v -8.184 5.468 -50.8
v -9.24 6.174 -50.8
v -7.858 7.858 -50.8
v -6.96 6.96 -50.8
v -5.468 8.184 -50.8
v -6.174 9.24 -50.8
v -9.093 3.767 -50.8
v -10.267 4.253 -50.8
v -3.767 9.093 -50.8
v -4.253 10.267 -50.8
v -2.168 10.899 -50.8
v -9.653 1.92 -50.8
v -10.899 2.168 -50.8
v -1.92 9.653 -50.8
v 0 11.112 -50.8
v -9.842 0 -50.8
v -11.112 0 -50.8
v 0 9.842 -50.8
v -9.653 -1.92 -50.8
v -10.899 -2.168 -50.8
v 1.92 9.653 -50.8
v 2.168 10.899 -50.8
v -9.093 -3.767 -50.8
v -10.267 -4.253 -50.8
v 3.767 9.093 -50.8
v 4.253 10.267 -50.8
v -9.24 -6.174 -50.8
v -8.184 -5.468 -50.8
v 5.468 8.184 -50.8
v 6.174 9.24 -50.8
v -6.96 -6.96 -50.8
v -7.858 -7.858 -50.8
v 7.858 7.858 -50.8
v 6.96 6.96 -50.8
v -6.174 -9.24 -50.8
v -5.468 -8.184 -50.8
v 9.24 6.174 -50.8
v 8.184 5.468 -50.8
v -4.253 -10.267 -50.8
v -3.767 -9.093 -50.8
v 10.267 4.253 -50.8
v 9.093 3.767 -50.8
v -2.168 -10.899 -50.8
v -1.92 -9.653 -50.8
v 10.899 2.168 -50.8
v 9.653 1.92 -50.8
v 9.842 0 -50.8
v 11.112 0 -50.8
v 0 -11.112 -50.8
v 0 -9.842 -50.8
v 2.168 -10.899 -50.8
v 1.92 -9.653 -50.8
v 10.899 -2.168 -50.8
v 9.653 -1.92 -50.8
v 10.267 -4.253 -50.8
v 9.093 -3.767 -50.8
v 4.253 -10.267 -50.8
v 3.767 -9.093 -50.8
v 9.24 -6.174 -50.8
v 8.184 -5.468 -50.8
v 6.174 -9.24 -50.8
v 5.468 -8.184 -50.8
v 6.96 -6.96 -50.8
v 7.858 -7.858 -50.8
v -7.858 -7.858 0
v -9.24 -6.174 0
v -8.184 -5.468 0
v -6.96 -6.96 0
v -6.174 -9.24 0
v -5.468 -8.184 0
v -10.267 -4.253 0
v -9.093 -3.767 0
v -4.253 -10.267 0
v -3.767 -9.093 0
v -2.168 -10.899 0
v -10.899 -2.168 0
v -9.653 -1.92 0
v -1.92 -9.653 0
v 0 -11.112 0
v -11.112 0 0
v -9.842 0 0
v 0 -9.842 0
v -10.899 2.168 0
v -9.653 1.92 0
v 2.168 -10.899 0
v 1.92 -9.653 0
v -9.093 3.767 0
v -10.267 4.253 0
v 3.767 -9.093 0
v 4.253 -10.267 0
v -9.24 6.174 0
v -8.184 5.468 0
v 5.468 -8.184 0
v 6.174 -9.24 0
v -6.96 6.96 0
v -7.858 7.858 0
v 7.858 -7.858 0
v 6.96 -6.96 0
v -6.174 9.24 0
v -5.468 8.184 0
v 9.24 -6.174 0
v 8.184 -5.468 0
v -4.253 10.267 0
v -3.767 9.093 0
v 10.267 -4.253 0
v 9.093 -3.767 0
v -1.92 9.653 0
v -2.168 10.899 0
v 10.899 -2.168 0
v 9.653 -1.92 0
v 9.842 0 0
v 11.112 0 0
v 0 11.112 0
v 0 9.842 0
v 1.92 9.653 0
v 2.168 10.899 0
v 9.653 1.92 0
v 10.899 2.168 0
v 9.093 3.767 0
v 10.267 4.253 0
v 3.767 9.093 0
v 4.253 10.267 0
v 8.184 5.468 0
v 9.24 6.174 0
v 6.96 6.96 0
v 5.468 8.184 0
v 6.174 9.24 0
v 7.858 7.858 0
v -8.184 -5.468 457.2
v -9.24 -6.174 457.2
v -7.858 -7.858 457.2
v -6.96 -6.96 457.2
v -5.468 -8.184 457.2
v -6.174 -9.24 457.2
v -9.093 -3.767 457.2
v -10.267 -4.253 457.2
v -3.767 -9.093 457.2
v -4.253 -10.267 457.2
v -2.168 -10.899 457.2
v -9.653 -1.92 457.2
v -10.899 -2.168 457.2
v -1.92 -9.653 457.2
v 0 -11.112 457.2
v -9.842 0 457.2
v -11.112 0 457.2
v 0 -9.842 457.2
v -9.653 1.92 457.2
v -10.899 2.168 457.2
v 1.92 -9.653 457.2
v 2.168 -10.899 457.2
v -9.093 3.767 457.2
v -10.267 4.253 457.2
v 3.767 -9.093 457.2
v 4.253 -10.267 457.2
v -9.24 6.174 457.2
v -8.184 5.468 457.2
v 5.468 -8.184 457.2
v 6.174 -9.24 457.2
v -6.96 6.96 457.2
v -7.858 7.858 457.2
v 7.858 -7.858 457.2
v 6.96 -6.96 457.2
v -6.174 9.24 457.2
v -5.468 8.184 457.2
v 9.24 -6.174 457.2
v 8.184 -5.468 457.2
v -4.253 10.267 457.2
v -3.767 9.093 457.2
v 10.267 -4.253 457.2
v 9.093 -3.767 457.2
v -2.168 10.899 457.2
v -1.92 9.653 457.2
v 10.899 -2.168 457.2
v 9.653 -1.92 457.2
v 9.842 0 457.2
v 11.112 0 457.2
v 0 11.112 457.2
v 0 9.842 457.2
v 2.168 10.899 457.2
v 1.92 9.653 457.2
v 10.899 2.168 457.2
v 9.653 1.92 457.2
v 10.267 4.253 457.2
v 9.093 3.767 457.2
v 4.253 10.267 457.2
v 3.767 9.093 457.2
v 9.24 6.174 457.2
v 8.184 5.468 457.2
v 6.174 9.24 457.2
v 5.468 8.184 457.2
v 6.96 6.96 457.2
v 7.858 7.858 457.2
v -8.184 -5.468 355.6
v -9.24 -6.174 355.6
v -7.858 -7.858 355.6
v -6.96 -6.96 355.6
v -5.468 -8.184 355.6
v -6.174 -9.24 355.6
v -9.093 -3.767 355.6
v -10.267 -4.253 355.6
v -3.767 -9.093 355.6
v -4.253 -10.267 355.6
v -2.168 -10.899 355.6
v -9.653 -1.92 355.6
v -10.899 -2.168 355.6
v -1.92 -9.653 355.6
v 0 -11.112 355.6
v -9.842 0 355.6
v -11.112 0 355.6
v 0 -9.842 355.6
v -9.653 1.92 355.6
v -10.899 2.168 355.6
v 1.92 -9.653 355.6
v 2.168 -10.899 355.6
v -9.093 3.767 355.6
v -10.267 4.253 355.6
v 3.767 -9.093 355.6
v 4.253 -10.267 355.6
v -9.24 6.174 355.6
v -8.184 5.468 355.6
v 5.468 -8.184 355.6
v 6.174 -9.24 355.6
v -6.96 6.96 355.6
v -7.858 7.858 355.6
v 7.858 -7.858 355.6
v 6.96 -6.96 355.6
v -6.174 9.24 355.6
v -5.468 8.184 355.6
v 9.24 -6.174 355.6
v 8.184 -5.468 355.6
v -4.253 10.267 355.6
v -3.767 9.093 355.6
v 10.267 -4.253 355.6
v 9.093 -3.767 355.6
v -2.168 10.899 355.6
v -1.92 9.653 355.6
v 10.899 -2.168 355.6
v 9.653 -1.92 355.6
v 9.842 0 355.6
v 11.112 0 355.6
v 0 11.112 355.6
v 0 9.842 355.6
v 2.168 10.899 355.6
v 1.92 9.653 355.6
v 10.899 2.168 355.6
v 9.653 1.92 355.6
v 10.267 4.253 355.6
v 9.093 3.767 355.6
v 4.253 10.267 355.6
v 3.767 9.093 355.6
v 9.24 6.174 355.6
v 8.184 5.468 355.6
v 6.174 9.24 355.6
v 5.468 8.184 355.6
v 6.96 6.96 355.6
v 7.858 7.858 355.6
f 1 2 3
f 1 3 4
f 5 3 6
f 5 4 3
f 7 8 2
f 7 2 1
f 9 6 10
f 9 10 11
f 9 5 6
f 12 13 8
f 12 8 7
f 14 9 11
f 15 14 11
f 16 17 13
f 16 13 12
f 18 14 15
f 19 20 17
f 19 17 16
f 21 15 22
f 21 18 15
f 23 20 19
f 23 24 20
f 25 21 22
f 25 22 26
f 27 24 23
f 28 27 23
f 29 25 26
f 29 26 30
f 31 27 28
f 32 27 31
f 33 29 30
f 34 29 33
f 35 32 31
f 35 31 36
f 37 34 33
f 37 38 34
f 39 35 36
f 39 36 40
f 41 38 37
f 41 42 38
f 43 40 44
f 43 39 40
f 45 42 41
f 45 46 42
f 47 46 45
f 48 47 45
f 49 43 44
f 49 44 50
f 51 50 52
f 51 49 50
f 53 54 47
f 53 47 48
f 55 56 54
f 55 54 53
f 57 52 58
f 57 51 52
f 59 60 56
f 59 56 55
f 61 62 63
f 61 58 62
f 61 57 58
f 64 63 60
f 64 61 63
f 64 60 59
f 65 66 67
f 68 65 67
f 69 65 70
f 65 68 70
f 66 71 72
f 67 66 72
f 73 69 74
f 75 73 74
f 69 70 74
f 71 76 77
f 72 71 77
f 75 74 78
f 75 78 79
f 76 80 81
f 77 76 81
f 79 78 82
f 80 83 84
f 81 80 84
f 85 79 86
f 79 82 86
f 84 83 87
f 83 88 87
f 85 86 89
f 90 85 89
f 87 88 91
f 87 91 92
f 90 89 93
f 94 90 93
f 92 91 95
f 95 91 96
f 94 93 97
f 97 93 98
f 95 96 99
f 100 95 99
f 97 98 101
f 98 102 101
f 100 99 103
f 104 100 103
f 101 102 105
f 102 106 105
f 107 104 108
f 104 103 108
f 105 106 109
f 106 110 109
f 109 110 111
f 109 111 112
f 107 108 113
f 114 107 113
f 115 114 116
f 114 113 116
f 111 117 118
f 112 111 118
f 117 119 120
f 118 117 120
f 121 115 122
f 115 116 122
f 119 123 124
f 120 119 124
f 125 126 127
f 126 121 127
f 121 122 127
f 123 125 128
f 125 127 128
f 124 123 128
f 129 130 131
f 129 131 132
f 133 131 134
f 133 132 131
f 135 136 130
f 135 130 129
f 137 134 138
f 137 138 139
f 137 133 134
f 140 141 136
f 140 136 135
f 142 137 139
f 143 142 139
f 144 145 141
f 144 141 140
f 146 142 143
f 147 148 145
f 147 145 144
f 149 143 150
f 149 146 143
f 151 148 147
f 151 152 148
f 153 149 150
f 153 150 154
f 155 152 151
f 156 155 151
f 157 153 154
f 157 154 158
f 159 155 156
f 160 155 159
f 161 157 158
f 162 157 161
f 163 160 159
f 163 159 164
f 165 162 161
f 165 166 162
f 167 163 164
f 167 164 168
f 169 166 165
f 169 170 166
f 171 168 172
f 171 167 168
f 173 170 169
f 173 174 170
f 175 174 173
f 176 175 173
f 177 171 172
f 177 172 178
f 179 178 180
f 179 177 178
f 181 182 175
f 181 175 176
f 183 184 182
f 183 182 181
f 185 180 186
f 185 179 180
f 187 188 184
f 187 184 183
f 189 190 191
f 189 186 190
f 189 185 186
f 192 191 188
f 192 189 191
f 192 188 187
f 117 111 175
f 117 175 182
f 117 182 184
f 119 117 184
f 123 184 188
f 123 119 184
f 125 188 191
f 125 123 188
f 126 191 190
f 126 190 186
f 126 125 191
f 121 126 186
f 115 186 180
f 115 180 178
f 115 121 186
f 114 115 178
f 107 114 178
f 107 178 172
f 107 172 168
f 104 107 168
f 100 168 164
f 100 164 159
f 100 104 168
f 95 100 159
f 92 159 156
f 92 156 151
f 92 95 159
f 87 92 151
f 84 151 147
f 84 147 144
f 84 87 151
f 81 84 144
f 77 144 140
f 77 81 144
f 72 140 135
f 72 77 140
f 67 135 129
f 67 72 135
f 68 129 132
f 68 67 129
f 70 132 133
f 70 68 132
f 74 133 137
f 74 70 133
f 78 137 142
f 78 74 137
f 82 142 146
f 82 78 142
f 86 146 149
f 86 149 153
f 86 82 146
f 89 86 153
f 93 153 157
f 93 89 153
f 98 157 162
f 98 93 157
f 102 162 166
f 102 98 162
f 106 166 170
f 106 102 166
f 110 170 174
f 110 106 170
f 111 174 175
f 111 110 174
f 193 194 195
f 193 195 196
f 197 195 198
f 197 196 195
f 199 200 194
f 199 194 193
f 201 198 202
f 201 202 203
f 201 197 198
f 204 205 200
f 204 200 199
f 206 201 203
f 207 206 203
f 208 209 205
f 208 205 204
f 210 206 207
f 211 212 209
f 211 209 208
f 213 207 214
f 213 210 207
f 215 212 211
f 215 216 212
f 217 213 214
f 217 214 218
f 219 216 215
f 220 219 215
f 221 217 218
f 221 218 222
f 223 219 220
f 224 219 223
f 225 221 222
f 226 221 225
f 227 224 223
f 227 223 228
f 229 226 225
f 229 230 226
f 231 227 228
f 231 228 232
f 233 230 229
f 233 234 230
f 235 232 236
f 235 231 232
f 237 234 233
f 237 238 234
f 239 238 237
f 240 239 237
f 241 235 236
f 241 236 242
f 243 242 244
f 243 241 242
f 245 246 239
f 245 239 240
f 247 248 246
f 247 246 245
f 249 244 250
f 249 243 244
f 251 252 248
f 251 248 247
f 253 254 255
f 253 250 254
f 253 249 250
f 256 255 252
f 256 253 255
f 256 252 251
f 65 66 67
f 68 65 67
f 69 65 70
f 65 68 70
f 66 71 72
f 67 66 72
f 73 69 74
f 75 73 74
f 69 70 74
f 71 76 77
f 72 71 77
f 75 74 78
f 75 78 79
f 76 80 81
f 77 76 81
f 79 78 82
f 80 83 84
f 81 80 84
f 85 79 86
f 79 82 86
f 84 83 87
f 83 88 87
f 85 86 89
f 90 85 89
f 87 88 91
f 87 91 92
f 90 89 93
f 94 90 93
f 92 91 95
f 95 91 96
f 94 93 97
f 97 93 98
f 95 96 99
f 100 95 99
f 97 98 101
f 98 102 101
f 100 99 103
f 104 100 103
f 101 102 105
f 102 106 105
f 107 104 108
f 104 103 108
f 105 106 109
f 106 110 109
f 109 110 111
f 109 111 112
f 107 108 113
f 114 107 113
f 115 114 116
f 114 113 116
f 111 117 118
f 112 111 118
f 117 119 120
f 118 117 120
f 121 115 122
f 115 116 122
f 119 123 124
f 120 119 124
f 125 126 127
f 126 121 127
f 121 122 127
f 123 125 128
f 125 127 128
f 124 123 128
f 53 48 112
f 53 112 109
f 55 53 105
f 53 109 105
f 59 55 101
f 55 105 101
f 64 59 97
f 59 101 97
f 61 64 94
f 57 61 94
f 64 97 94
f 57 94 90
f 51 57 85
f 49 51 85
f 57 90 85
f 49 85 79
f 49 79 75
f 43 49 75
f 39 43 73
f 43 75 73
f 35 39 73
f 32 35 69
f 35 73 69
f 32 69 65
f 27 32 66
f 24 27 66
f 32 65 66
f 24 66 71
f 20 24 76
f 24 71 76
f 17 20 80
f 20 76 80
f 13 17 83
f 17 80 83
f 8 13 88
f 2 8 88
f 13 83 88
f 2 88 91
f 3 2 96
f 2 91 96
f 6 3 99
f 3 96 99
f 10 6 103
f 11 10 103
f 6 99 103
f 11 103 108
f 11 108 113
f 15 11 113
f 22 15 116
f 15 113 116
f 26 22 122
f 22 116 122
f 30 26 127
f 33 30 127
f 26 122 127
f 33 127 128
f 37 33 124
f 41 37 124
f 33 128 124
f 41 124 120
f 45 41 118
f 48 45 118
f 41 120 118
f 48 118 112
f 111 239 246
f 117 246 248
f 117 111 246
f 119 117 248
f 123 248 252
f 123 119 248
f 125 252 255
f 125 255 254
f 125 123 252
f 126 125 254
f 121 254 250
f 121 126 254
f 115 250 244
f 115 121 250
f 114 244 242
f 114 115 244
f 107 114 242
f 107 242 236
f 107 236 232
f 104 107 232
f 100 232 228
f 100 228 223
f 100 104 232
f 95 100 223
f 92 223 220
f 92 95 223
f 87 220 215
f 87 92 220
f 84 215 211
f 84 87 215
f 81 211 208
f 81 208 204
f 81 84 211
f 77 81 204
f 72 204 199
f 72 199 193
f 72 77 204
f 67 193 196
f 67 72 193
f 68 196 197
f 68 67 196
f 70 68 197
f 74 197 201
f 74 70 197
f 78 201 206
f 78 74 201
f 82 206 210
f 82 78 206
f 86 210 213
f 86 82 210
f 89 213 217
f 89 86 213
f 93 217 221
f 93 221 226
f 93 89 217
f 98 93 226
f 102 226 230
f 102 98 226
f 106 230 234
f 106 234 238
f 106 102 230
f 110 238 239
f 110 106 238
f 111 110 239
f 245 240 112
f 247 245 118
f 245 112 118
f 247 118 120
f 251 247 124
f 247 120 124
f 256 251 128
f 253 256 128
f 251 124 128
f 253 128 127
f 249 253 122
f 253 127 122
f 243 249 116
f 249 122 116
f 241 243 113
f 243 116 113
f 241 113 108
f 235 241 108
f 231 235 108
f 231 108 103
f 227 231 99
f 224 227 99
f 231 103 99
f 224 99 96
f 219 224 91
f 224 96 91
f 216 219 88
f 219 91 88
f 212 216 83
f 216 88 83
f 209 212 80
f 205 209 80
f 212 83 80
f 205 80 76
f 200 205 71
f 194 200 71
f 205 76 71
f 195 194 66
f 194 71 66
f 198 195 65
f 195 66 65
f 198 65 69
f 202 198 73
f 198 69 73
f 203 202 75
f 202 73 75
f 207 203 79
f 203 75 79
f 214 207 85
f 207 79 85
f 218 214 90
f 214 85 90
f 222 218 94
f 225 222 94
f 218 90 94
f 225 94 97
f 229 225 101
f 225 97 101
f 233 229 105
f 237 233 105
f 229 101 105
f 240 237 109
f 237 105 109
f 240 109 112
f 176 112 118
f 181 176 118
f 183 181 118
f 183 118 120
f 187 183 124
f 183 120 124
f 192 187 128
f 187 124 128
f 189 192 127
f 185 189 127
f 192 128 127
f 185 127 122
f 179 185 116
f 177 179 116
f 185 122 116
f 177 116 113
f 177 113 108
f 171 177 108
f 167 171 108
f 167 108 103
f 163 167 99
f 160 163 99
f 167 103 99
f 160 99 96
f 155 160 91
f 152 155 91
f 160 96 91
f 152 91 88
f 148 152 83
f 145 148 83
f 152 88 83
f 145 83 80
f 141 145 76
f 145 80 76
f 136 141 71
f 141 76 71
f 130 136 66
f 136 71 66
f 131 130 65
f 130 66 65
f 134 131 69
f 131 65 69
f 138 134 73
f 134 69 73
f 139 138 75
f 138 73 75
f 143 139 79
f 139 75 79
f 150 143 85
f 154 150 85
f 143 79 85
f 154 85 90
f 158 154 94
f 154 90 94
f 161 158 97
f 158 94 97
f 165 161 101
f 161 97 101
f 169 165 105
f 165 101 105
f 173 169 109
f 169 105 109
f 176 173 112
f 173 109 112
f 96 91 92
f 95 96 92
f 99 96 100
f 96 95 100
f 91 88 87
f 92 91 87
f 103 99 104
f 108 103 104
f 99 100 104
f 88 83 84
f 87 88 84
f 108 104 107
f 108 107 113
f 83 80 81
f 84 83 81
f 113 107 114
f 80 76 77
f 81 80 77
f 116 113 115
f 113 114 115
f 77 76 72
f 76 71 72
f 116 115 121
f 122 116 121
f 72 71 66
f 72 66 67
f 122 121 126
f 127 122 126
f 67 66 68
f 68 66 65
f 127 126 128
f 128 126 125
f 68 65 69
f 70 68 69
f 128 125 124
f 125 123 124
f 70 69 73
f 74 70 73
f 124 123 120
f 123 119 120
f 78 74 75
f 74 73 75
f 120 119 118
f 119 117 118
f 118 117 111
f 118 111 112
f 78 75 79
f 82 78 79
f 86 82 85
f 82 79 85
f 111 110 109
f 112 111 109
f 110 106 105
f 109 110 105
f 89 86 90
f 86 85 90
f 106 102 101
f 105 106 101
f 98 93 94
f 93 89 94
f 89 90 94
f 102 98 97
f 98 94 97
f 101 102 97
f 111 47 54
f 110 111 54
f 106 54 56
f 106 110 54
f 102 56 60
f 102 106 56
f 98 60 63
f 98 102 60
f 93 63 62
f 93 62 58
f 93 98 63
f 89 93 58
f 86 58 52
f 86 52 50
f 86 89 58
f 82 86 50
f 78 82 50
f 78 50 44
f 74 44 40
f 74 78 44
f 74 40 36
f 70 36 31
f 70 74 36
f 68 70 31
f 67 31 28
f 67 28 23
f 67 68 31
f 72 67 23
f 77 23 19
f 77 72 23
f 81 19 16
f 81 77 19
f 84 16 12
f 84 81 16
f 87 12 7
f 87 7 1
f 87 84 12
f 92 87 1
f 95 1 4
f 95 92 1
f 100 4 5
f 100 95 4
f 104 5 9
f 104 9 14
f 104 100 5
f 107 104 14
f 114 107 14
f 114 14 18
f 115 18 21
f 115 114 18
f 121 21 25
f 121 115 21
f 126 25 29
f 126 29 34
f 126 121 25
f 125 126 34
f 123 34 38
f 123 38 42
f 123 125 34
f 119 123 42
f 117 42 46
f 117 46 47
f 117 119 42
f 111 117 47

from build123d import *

# Parameters (mm, degrees)
F0_R        = 11.1125
F0_R_2      = 9.8425
F1_DEPTH    = 457.2
F1_FACE_R   = 11.1125
F1_FACE_R_2 = 9.8425
F2_DEPTH    = 50.8
F3_DEPTH    = 355.6


with BuildPart() as f1:
    # F0 (on Top) → F1 (new body)
    with BuildSketch(Plane.XY):
        Circle(F0_R)
        Circle(F0_R_2, mode=Mode.SUBTRACT)
    extrude(amount=F1_DEPTH)


with BuildPart() as f2:
    # F1_face (on face) → F2 (new body)
    with BuildSketch(Plane(origin=(0, 0, 0), x_dir=(1, 0, 0), z_dir=(0, 0, -1))):
        Circle(F1_FACE_R)
        Circle(F1_FACE_R_2, mode=Mode.SUBTRACT)
    extrude(amount=F2_DEPTH)


with BuildPart() as f3:
    # F0 (on Top) → F3 (new body)
    with BuildSketch(Plane.XY):
        Circle(F0_R)
        Circle(F0_R_2, mode=Mode.SUBTRACT)
    extrude(amount=F3_DEPTH)


solid = Compound([f1.part, f2.part, f3.part])
